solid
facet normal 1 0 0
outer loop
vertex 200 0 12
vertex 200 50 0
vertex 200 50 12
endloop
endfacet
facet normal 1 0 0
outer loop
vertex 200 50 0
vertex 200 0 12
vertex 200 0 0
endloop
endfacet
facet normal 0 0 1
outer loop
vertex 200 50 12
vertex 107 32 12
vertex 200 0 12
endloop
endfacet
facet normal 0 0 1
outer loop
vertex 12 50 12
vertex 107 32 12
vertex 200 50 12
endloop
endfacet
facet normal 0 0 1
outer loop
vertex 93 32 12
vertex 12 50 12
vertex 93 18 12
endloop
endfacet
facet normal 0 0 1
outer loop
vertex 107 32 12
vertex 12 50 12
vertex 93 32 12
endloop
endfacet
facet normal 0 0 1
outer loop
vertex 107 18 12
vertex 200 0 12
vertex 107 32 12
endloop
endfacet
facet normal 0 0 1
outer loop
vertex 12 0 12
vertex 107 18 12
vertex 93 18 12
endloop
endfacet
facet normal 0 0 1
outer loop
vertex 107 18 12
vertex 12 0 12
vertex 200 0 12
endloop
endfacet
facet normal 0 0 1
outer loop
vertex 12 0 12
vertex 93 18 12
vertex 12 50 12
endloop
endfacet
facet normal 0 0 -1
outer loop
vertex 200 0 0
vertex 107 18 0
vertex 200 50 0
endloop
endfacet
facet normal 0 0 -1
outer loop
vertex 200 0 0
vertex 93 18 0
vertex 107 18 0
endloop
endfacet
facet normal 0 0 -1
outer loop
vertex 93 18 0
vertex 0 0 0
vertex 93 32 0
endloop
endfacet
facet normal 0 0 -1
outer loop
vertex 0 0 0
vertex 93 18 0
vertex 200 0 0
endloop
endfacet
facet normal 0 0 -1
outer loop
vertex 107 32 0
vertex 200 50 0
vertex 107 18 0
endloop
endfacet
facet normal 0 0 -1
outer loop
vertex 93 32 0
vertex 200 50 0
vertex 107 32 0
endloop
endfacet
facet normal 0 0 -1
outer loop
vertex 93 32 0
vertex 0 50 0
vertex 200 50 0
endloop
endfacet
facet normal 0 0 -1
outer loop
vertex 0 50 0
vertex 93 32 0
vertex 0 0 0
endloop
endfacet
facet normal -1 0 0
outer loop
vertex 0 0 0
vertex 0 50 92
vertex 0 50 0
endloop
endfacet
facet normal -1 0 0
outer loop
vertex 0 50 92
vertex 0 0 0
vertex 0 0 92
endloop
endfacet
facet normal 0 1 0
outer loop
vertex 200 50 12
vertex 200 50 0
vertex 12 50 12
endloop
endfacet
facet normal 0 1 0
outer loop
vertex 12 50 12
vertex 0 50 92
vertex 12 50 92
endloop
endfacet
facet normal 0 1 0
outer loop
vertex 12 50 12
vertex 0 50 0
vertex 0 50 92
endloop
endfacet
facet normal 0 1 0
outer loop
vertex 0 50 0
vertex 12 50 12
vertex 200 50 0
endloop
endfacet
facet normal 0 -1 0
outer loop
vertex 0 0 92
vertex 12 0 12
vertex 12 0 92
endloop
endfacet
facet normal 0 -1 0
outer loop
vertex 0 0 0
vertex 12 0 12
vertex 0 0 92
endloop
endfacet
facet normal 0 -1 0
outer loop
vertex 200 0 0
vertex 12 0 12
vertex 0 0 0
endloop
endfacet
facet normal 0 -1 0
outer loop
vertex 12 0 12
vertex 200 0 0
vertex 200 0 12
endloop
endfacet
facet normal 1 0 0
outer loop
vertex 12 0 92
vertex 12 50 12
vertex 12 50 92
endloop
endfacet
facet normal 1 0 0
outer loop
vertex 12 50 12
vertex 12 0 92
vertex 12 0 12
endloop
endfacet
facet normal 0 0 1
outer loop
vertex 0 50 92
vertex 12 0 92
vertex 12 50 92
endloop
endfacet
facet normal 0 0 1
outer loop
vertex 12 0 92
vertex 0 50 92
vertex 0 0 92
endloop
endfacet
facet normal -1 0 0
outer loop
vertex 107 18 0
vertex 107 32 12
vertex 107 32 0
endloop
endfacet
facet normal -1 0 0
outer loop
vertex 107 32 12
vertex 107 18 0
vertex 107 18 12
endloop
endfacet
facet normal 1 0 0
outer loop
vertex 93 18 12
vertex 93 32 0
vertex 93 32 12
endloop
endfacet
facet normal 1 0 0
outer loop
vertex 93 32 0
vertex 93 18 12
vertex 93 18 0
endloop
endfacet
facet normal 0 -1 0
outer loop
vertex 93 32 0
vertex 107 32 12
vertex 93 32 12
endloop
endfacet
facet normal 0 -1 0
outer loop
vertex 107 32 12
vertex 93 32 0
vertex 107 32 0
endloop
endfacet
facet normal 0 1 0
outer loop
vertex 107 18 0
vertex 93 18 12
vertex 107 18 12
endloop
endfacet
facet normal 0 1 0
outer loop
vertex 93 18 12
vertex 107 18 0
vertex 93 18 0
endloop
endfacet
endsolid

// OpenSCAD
$fn = 32;

// ----------------------------------------------------------------------
// Gantry bracket: 200-250 mm L bracket
// ----------------------------------------------------------------------

// --- parameters (mm) ---
base_l = 200;             // base arm length, X
arm_w = 50;               // arm width, Y
thick = 12;               // arm thickness
up_h = 80;                // vertical arm height, Z
slot_w = 14;              // adjustment slot width in the base
fit_tol = 0.05;           // tolerance for press fits, mm
free_tol = 0.2;           // tolerance for clearance fits, mm

total_h = up_h + thick;  // overall height

difference() {
  union() {
    cube([base_l, arm_w, thick]);
    cube([thick, arm_w, total_h]);
  }
  translate([base_l / 2 - slot_w / 2, arm_w / 2 - slot_w / 2, -1])
    cube([slot_w, slot_w, thick + 2]);
}
